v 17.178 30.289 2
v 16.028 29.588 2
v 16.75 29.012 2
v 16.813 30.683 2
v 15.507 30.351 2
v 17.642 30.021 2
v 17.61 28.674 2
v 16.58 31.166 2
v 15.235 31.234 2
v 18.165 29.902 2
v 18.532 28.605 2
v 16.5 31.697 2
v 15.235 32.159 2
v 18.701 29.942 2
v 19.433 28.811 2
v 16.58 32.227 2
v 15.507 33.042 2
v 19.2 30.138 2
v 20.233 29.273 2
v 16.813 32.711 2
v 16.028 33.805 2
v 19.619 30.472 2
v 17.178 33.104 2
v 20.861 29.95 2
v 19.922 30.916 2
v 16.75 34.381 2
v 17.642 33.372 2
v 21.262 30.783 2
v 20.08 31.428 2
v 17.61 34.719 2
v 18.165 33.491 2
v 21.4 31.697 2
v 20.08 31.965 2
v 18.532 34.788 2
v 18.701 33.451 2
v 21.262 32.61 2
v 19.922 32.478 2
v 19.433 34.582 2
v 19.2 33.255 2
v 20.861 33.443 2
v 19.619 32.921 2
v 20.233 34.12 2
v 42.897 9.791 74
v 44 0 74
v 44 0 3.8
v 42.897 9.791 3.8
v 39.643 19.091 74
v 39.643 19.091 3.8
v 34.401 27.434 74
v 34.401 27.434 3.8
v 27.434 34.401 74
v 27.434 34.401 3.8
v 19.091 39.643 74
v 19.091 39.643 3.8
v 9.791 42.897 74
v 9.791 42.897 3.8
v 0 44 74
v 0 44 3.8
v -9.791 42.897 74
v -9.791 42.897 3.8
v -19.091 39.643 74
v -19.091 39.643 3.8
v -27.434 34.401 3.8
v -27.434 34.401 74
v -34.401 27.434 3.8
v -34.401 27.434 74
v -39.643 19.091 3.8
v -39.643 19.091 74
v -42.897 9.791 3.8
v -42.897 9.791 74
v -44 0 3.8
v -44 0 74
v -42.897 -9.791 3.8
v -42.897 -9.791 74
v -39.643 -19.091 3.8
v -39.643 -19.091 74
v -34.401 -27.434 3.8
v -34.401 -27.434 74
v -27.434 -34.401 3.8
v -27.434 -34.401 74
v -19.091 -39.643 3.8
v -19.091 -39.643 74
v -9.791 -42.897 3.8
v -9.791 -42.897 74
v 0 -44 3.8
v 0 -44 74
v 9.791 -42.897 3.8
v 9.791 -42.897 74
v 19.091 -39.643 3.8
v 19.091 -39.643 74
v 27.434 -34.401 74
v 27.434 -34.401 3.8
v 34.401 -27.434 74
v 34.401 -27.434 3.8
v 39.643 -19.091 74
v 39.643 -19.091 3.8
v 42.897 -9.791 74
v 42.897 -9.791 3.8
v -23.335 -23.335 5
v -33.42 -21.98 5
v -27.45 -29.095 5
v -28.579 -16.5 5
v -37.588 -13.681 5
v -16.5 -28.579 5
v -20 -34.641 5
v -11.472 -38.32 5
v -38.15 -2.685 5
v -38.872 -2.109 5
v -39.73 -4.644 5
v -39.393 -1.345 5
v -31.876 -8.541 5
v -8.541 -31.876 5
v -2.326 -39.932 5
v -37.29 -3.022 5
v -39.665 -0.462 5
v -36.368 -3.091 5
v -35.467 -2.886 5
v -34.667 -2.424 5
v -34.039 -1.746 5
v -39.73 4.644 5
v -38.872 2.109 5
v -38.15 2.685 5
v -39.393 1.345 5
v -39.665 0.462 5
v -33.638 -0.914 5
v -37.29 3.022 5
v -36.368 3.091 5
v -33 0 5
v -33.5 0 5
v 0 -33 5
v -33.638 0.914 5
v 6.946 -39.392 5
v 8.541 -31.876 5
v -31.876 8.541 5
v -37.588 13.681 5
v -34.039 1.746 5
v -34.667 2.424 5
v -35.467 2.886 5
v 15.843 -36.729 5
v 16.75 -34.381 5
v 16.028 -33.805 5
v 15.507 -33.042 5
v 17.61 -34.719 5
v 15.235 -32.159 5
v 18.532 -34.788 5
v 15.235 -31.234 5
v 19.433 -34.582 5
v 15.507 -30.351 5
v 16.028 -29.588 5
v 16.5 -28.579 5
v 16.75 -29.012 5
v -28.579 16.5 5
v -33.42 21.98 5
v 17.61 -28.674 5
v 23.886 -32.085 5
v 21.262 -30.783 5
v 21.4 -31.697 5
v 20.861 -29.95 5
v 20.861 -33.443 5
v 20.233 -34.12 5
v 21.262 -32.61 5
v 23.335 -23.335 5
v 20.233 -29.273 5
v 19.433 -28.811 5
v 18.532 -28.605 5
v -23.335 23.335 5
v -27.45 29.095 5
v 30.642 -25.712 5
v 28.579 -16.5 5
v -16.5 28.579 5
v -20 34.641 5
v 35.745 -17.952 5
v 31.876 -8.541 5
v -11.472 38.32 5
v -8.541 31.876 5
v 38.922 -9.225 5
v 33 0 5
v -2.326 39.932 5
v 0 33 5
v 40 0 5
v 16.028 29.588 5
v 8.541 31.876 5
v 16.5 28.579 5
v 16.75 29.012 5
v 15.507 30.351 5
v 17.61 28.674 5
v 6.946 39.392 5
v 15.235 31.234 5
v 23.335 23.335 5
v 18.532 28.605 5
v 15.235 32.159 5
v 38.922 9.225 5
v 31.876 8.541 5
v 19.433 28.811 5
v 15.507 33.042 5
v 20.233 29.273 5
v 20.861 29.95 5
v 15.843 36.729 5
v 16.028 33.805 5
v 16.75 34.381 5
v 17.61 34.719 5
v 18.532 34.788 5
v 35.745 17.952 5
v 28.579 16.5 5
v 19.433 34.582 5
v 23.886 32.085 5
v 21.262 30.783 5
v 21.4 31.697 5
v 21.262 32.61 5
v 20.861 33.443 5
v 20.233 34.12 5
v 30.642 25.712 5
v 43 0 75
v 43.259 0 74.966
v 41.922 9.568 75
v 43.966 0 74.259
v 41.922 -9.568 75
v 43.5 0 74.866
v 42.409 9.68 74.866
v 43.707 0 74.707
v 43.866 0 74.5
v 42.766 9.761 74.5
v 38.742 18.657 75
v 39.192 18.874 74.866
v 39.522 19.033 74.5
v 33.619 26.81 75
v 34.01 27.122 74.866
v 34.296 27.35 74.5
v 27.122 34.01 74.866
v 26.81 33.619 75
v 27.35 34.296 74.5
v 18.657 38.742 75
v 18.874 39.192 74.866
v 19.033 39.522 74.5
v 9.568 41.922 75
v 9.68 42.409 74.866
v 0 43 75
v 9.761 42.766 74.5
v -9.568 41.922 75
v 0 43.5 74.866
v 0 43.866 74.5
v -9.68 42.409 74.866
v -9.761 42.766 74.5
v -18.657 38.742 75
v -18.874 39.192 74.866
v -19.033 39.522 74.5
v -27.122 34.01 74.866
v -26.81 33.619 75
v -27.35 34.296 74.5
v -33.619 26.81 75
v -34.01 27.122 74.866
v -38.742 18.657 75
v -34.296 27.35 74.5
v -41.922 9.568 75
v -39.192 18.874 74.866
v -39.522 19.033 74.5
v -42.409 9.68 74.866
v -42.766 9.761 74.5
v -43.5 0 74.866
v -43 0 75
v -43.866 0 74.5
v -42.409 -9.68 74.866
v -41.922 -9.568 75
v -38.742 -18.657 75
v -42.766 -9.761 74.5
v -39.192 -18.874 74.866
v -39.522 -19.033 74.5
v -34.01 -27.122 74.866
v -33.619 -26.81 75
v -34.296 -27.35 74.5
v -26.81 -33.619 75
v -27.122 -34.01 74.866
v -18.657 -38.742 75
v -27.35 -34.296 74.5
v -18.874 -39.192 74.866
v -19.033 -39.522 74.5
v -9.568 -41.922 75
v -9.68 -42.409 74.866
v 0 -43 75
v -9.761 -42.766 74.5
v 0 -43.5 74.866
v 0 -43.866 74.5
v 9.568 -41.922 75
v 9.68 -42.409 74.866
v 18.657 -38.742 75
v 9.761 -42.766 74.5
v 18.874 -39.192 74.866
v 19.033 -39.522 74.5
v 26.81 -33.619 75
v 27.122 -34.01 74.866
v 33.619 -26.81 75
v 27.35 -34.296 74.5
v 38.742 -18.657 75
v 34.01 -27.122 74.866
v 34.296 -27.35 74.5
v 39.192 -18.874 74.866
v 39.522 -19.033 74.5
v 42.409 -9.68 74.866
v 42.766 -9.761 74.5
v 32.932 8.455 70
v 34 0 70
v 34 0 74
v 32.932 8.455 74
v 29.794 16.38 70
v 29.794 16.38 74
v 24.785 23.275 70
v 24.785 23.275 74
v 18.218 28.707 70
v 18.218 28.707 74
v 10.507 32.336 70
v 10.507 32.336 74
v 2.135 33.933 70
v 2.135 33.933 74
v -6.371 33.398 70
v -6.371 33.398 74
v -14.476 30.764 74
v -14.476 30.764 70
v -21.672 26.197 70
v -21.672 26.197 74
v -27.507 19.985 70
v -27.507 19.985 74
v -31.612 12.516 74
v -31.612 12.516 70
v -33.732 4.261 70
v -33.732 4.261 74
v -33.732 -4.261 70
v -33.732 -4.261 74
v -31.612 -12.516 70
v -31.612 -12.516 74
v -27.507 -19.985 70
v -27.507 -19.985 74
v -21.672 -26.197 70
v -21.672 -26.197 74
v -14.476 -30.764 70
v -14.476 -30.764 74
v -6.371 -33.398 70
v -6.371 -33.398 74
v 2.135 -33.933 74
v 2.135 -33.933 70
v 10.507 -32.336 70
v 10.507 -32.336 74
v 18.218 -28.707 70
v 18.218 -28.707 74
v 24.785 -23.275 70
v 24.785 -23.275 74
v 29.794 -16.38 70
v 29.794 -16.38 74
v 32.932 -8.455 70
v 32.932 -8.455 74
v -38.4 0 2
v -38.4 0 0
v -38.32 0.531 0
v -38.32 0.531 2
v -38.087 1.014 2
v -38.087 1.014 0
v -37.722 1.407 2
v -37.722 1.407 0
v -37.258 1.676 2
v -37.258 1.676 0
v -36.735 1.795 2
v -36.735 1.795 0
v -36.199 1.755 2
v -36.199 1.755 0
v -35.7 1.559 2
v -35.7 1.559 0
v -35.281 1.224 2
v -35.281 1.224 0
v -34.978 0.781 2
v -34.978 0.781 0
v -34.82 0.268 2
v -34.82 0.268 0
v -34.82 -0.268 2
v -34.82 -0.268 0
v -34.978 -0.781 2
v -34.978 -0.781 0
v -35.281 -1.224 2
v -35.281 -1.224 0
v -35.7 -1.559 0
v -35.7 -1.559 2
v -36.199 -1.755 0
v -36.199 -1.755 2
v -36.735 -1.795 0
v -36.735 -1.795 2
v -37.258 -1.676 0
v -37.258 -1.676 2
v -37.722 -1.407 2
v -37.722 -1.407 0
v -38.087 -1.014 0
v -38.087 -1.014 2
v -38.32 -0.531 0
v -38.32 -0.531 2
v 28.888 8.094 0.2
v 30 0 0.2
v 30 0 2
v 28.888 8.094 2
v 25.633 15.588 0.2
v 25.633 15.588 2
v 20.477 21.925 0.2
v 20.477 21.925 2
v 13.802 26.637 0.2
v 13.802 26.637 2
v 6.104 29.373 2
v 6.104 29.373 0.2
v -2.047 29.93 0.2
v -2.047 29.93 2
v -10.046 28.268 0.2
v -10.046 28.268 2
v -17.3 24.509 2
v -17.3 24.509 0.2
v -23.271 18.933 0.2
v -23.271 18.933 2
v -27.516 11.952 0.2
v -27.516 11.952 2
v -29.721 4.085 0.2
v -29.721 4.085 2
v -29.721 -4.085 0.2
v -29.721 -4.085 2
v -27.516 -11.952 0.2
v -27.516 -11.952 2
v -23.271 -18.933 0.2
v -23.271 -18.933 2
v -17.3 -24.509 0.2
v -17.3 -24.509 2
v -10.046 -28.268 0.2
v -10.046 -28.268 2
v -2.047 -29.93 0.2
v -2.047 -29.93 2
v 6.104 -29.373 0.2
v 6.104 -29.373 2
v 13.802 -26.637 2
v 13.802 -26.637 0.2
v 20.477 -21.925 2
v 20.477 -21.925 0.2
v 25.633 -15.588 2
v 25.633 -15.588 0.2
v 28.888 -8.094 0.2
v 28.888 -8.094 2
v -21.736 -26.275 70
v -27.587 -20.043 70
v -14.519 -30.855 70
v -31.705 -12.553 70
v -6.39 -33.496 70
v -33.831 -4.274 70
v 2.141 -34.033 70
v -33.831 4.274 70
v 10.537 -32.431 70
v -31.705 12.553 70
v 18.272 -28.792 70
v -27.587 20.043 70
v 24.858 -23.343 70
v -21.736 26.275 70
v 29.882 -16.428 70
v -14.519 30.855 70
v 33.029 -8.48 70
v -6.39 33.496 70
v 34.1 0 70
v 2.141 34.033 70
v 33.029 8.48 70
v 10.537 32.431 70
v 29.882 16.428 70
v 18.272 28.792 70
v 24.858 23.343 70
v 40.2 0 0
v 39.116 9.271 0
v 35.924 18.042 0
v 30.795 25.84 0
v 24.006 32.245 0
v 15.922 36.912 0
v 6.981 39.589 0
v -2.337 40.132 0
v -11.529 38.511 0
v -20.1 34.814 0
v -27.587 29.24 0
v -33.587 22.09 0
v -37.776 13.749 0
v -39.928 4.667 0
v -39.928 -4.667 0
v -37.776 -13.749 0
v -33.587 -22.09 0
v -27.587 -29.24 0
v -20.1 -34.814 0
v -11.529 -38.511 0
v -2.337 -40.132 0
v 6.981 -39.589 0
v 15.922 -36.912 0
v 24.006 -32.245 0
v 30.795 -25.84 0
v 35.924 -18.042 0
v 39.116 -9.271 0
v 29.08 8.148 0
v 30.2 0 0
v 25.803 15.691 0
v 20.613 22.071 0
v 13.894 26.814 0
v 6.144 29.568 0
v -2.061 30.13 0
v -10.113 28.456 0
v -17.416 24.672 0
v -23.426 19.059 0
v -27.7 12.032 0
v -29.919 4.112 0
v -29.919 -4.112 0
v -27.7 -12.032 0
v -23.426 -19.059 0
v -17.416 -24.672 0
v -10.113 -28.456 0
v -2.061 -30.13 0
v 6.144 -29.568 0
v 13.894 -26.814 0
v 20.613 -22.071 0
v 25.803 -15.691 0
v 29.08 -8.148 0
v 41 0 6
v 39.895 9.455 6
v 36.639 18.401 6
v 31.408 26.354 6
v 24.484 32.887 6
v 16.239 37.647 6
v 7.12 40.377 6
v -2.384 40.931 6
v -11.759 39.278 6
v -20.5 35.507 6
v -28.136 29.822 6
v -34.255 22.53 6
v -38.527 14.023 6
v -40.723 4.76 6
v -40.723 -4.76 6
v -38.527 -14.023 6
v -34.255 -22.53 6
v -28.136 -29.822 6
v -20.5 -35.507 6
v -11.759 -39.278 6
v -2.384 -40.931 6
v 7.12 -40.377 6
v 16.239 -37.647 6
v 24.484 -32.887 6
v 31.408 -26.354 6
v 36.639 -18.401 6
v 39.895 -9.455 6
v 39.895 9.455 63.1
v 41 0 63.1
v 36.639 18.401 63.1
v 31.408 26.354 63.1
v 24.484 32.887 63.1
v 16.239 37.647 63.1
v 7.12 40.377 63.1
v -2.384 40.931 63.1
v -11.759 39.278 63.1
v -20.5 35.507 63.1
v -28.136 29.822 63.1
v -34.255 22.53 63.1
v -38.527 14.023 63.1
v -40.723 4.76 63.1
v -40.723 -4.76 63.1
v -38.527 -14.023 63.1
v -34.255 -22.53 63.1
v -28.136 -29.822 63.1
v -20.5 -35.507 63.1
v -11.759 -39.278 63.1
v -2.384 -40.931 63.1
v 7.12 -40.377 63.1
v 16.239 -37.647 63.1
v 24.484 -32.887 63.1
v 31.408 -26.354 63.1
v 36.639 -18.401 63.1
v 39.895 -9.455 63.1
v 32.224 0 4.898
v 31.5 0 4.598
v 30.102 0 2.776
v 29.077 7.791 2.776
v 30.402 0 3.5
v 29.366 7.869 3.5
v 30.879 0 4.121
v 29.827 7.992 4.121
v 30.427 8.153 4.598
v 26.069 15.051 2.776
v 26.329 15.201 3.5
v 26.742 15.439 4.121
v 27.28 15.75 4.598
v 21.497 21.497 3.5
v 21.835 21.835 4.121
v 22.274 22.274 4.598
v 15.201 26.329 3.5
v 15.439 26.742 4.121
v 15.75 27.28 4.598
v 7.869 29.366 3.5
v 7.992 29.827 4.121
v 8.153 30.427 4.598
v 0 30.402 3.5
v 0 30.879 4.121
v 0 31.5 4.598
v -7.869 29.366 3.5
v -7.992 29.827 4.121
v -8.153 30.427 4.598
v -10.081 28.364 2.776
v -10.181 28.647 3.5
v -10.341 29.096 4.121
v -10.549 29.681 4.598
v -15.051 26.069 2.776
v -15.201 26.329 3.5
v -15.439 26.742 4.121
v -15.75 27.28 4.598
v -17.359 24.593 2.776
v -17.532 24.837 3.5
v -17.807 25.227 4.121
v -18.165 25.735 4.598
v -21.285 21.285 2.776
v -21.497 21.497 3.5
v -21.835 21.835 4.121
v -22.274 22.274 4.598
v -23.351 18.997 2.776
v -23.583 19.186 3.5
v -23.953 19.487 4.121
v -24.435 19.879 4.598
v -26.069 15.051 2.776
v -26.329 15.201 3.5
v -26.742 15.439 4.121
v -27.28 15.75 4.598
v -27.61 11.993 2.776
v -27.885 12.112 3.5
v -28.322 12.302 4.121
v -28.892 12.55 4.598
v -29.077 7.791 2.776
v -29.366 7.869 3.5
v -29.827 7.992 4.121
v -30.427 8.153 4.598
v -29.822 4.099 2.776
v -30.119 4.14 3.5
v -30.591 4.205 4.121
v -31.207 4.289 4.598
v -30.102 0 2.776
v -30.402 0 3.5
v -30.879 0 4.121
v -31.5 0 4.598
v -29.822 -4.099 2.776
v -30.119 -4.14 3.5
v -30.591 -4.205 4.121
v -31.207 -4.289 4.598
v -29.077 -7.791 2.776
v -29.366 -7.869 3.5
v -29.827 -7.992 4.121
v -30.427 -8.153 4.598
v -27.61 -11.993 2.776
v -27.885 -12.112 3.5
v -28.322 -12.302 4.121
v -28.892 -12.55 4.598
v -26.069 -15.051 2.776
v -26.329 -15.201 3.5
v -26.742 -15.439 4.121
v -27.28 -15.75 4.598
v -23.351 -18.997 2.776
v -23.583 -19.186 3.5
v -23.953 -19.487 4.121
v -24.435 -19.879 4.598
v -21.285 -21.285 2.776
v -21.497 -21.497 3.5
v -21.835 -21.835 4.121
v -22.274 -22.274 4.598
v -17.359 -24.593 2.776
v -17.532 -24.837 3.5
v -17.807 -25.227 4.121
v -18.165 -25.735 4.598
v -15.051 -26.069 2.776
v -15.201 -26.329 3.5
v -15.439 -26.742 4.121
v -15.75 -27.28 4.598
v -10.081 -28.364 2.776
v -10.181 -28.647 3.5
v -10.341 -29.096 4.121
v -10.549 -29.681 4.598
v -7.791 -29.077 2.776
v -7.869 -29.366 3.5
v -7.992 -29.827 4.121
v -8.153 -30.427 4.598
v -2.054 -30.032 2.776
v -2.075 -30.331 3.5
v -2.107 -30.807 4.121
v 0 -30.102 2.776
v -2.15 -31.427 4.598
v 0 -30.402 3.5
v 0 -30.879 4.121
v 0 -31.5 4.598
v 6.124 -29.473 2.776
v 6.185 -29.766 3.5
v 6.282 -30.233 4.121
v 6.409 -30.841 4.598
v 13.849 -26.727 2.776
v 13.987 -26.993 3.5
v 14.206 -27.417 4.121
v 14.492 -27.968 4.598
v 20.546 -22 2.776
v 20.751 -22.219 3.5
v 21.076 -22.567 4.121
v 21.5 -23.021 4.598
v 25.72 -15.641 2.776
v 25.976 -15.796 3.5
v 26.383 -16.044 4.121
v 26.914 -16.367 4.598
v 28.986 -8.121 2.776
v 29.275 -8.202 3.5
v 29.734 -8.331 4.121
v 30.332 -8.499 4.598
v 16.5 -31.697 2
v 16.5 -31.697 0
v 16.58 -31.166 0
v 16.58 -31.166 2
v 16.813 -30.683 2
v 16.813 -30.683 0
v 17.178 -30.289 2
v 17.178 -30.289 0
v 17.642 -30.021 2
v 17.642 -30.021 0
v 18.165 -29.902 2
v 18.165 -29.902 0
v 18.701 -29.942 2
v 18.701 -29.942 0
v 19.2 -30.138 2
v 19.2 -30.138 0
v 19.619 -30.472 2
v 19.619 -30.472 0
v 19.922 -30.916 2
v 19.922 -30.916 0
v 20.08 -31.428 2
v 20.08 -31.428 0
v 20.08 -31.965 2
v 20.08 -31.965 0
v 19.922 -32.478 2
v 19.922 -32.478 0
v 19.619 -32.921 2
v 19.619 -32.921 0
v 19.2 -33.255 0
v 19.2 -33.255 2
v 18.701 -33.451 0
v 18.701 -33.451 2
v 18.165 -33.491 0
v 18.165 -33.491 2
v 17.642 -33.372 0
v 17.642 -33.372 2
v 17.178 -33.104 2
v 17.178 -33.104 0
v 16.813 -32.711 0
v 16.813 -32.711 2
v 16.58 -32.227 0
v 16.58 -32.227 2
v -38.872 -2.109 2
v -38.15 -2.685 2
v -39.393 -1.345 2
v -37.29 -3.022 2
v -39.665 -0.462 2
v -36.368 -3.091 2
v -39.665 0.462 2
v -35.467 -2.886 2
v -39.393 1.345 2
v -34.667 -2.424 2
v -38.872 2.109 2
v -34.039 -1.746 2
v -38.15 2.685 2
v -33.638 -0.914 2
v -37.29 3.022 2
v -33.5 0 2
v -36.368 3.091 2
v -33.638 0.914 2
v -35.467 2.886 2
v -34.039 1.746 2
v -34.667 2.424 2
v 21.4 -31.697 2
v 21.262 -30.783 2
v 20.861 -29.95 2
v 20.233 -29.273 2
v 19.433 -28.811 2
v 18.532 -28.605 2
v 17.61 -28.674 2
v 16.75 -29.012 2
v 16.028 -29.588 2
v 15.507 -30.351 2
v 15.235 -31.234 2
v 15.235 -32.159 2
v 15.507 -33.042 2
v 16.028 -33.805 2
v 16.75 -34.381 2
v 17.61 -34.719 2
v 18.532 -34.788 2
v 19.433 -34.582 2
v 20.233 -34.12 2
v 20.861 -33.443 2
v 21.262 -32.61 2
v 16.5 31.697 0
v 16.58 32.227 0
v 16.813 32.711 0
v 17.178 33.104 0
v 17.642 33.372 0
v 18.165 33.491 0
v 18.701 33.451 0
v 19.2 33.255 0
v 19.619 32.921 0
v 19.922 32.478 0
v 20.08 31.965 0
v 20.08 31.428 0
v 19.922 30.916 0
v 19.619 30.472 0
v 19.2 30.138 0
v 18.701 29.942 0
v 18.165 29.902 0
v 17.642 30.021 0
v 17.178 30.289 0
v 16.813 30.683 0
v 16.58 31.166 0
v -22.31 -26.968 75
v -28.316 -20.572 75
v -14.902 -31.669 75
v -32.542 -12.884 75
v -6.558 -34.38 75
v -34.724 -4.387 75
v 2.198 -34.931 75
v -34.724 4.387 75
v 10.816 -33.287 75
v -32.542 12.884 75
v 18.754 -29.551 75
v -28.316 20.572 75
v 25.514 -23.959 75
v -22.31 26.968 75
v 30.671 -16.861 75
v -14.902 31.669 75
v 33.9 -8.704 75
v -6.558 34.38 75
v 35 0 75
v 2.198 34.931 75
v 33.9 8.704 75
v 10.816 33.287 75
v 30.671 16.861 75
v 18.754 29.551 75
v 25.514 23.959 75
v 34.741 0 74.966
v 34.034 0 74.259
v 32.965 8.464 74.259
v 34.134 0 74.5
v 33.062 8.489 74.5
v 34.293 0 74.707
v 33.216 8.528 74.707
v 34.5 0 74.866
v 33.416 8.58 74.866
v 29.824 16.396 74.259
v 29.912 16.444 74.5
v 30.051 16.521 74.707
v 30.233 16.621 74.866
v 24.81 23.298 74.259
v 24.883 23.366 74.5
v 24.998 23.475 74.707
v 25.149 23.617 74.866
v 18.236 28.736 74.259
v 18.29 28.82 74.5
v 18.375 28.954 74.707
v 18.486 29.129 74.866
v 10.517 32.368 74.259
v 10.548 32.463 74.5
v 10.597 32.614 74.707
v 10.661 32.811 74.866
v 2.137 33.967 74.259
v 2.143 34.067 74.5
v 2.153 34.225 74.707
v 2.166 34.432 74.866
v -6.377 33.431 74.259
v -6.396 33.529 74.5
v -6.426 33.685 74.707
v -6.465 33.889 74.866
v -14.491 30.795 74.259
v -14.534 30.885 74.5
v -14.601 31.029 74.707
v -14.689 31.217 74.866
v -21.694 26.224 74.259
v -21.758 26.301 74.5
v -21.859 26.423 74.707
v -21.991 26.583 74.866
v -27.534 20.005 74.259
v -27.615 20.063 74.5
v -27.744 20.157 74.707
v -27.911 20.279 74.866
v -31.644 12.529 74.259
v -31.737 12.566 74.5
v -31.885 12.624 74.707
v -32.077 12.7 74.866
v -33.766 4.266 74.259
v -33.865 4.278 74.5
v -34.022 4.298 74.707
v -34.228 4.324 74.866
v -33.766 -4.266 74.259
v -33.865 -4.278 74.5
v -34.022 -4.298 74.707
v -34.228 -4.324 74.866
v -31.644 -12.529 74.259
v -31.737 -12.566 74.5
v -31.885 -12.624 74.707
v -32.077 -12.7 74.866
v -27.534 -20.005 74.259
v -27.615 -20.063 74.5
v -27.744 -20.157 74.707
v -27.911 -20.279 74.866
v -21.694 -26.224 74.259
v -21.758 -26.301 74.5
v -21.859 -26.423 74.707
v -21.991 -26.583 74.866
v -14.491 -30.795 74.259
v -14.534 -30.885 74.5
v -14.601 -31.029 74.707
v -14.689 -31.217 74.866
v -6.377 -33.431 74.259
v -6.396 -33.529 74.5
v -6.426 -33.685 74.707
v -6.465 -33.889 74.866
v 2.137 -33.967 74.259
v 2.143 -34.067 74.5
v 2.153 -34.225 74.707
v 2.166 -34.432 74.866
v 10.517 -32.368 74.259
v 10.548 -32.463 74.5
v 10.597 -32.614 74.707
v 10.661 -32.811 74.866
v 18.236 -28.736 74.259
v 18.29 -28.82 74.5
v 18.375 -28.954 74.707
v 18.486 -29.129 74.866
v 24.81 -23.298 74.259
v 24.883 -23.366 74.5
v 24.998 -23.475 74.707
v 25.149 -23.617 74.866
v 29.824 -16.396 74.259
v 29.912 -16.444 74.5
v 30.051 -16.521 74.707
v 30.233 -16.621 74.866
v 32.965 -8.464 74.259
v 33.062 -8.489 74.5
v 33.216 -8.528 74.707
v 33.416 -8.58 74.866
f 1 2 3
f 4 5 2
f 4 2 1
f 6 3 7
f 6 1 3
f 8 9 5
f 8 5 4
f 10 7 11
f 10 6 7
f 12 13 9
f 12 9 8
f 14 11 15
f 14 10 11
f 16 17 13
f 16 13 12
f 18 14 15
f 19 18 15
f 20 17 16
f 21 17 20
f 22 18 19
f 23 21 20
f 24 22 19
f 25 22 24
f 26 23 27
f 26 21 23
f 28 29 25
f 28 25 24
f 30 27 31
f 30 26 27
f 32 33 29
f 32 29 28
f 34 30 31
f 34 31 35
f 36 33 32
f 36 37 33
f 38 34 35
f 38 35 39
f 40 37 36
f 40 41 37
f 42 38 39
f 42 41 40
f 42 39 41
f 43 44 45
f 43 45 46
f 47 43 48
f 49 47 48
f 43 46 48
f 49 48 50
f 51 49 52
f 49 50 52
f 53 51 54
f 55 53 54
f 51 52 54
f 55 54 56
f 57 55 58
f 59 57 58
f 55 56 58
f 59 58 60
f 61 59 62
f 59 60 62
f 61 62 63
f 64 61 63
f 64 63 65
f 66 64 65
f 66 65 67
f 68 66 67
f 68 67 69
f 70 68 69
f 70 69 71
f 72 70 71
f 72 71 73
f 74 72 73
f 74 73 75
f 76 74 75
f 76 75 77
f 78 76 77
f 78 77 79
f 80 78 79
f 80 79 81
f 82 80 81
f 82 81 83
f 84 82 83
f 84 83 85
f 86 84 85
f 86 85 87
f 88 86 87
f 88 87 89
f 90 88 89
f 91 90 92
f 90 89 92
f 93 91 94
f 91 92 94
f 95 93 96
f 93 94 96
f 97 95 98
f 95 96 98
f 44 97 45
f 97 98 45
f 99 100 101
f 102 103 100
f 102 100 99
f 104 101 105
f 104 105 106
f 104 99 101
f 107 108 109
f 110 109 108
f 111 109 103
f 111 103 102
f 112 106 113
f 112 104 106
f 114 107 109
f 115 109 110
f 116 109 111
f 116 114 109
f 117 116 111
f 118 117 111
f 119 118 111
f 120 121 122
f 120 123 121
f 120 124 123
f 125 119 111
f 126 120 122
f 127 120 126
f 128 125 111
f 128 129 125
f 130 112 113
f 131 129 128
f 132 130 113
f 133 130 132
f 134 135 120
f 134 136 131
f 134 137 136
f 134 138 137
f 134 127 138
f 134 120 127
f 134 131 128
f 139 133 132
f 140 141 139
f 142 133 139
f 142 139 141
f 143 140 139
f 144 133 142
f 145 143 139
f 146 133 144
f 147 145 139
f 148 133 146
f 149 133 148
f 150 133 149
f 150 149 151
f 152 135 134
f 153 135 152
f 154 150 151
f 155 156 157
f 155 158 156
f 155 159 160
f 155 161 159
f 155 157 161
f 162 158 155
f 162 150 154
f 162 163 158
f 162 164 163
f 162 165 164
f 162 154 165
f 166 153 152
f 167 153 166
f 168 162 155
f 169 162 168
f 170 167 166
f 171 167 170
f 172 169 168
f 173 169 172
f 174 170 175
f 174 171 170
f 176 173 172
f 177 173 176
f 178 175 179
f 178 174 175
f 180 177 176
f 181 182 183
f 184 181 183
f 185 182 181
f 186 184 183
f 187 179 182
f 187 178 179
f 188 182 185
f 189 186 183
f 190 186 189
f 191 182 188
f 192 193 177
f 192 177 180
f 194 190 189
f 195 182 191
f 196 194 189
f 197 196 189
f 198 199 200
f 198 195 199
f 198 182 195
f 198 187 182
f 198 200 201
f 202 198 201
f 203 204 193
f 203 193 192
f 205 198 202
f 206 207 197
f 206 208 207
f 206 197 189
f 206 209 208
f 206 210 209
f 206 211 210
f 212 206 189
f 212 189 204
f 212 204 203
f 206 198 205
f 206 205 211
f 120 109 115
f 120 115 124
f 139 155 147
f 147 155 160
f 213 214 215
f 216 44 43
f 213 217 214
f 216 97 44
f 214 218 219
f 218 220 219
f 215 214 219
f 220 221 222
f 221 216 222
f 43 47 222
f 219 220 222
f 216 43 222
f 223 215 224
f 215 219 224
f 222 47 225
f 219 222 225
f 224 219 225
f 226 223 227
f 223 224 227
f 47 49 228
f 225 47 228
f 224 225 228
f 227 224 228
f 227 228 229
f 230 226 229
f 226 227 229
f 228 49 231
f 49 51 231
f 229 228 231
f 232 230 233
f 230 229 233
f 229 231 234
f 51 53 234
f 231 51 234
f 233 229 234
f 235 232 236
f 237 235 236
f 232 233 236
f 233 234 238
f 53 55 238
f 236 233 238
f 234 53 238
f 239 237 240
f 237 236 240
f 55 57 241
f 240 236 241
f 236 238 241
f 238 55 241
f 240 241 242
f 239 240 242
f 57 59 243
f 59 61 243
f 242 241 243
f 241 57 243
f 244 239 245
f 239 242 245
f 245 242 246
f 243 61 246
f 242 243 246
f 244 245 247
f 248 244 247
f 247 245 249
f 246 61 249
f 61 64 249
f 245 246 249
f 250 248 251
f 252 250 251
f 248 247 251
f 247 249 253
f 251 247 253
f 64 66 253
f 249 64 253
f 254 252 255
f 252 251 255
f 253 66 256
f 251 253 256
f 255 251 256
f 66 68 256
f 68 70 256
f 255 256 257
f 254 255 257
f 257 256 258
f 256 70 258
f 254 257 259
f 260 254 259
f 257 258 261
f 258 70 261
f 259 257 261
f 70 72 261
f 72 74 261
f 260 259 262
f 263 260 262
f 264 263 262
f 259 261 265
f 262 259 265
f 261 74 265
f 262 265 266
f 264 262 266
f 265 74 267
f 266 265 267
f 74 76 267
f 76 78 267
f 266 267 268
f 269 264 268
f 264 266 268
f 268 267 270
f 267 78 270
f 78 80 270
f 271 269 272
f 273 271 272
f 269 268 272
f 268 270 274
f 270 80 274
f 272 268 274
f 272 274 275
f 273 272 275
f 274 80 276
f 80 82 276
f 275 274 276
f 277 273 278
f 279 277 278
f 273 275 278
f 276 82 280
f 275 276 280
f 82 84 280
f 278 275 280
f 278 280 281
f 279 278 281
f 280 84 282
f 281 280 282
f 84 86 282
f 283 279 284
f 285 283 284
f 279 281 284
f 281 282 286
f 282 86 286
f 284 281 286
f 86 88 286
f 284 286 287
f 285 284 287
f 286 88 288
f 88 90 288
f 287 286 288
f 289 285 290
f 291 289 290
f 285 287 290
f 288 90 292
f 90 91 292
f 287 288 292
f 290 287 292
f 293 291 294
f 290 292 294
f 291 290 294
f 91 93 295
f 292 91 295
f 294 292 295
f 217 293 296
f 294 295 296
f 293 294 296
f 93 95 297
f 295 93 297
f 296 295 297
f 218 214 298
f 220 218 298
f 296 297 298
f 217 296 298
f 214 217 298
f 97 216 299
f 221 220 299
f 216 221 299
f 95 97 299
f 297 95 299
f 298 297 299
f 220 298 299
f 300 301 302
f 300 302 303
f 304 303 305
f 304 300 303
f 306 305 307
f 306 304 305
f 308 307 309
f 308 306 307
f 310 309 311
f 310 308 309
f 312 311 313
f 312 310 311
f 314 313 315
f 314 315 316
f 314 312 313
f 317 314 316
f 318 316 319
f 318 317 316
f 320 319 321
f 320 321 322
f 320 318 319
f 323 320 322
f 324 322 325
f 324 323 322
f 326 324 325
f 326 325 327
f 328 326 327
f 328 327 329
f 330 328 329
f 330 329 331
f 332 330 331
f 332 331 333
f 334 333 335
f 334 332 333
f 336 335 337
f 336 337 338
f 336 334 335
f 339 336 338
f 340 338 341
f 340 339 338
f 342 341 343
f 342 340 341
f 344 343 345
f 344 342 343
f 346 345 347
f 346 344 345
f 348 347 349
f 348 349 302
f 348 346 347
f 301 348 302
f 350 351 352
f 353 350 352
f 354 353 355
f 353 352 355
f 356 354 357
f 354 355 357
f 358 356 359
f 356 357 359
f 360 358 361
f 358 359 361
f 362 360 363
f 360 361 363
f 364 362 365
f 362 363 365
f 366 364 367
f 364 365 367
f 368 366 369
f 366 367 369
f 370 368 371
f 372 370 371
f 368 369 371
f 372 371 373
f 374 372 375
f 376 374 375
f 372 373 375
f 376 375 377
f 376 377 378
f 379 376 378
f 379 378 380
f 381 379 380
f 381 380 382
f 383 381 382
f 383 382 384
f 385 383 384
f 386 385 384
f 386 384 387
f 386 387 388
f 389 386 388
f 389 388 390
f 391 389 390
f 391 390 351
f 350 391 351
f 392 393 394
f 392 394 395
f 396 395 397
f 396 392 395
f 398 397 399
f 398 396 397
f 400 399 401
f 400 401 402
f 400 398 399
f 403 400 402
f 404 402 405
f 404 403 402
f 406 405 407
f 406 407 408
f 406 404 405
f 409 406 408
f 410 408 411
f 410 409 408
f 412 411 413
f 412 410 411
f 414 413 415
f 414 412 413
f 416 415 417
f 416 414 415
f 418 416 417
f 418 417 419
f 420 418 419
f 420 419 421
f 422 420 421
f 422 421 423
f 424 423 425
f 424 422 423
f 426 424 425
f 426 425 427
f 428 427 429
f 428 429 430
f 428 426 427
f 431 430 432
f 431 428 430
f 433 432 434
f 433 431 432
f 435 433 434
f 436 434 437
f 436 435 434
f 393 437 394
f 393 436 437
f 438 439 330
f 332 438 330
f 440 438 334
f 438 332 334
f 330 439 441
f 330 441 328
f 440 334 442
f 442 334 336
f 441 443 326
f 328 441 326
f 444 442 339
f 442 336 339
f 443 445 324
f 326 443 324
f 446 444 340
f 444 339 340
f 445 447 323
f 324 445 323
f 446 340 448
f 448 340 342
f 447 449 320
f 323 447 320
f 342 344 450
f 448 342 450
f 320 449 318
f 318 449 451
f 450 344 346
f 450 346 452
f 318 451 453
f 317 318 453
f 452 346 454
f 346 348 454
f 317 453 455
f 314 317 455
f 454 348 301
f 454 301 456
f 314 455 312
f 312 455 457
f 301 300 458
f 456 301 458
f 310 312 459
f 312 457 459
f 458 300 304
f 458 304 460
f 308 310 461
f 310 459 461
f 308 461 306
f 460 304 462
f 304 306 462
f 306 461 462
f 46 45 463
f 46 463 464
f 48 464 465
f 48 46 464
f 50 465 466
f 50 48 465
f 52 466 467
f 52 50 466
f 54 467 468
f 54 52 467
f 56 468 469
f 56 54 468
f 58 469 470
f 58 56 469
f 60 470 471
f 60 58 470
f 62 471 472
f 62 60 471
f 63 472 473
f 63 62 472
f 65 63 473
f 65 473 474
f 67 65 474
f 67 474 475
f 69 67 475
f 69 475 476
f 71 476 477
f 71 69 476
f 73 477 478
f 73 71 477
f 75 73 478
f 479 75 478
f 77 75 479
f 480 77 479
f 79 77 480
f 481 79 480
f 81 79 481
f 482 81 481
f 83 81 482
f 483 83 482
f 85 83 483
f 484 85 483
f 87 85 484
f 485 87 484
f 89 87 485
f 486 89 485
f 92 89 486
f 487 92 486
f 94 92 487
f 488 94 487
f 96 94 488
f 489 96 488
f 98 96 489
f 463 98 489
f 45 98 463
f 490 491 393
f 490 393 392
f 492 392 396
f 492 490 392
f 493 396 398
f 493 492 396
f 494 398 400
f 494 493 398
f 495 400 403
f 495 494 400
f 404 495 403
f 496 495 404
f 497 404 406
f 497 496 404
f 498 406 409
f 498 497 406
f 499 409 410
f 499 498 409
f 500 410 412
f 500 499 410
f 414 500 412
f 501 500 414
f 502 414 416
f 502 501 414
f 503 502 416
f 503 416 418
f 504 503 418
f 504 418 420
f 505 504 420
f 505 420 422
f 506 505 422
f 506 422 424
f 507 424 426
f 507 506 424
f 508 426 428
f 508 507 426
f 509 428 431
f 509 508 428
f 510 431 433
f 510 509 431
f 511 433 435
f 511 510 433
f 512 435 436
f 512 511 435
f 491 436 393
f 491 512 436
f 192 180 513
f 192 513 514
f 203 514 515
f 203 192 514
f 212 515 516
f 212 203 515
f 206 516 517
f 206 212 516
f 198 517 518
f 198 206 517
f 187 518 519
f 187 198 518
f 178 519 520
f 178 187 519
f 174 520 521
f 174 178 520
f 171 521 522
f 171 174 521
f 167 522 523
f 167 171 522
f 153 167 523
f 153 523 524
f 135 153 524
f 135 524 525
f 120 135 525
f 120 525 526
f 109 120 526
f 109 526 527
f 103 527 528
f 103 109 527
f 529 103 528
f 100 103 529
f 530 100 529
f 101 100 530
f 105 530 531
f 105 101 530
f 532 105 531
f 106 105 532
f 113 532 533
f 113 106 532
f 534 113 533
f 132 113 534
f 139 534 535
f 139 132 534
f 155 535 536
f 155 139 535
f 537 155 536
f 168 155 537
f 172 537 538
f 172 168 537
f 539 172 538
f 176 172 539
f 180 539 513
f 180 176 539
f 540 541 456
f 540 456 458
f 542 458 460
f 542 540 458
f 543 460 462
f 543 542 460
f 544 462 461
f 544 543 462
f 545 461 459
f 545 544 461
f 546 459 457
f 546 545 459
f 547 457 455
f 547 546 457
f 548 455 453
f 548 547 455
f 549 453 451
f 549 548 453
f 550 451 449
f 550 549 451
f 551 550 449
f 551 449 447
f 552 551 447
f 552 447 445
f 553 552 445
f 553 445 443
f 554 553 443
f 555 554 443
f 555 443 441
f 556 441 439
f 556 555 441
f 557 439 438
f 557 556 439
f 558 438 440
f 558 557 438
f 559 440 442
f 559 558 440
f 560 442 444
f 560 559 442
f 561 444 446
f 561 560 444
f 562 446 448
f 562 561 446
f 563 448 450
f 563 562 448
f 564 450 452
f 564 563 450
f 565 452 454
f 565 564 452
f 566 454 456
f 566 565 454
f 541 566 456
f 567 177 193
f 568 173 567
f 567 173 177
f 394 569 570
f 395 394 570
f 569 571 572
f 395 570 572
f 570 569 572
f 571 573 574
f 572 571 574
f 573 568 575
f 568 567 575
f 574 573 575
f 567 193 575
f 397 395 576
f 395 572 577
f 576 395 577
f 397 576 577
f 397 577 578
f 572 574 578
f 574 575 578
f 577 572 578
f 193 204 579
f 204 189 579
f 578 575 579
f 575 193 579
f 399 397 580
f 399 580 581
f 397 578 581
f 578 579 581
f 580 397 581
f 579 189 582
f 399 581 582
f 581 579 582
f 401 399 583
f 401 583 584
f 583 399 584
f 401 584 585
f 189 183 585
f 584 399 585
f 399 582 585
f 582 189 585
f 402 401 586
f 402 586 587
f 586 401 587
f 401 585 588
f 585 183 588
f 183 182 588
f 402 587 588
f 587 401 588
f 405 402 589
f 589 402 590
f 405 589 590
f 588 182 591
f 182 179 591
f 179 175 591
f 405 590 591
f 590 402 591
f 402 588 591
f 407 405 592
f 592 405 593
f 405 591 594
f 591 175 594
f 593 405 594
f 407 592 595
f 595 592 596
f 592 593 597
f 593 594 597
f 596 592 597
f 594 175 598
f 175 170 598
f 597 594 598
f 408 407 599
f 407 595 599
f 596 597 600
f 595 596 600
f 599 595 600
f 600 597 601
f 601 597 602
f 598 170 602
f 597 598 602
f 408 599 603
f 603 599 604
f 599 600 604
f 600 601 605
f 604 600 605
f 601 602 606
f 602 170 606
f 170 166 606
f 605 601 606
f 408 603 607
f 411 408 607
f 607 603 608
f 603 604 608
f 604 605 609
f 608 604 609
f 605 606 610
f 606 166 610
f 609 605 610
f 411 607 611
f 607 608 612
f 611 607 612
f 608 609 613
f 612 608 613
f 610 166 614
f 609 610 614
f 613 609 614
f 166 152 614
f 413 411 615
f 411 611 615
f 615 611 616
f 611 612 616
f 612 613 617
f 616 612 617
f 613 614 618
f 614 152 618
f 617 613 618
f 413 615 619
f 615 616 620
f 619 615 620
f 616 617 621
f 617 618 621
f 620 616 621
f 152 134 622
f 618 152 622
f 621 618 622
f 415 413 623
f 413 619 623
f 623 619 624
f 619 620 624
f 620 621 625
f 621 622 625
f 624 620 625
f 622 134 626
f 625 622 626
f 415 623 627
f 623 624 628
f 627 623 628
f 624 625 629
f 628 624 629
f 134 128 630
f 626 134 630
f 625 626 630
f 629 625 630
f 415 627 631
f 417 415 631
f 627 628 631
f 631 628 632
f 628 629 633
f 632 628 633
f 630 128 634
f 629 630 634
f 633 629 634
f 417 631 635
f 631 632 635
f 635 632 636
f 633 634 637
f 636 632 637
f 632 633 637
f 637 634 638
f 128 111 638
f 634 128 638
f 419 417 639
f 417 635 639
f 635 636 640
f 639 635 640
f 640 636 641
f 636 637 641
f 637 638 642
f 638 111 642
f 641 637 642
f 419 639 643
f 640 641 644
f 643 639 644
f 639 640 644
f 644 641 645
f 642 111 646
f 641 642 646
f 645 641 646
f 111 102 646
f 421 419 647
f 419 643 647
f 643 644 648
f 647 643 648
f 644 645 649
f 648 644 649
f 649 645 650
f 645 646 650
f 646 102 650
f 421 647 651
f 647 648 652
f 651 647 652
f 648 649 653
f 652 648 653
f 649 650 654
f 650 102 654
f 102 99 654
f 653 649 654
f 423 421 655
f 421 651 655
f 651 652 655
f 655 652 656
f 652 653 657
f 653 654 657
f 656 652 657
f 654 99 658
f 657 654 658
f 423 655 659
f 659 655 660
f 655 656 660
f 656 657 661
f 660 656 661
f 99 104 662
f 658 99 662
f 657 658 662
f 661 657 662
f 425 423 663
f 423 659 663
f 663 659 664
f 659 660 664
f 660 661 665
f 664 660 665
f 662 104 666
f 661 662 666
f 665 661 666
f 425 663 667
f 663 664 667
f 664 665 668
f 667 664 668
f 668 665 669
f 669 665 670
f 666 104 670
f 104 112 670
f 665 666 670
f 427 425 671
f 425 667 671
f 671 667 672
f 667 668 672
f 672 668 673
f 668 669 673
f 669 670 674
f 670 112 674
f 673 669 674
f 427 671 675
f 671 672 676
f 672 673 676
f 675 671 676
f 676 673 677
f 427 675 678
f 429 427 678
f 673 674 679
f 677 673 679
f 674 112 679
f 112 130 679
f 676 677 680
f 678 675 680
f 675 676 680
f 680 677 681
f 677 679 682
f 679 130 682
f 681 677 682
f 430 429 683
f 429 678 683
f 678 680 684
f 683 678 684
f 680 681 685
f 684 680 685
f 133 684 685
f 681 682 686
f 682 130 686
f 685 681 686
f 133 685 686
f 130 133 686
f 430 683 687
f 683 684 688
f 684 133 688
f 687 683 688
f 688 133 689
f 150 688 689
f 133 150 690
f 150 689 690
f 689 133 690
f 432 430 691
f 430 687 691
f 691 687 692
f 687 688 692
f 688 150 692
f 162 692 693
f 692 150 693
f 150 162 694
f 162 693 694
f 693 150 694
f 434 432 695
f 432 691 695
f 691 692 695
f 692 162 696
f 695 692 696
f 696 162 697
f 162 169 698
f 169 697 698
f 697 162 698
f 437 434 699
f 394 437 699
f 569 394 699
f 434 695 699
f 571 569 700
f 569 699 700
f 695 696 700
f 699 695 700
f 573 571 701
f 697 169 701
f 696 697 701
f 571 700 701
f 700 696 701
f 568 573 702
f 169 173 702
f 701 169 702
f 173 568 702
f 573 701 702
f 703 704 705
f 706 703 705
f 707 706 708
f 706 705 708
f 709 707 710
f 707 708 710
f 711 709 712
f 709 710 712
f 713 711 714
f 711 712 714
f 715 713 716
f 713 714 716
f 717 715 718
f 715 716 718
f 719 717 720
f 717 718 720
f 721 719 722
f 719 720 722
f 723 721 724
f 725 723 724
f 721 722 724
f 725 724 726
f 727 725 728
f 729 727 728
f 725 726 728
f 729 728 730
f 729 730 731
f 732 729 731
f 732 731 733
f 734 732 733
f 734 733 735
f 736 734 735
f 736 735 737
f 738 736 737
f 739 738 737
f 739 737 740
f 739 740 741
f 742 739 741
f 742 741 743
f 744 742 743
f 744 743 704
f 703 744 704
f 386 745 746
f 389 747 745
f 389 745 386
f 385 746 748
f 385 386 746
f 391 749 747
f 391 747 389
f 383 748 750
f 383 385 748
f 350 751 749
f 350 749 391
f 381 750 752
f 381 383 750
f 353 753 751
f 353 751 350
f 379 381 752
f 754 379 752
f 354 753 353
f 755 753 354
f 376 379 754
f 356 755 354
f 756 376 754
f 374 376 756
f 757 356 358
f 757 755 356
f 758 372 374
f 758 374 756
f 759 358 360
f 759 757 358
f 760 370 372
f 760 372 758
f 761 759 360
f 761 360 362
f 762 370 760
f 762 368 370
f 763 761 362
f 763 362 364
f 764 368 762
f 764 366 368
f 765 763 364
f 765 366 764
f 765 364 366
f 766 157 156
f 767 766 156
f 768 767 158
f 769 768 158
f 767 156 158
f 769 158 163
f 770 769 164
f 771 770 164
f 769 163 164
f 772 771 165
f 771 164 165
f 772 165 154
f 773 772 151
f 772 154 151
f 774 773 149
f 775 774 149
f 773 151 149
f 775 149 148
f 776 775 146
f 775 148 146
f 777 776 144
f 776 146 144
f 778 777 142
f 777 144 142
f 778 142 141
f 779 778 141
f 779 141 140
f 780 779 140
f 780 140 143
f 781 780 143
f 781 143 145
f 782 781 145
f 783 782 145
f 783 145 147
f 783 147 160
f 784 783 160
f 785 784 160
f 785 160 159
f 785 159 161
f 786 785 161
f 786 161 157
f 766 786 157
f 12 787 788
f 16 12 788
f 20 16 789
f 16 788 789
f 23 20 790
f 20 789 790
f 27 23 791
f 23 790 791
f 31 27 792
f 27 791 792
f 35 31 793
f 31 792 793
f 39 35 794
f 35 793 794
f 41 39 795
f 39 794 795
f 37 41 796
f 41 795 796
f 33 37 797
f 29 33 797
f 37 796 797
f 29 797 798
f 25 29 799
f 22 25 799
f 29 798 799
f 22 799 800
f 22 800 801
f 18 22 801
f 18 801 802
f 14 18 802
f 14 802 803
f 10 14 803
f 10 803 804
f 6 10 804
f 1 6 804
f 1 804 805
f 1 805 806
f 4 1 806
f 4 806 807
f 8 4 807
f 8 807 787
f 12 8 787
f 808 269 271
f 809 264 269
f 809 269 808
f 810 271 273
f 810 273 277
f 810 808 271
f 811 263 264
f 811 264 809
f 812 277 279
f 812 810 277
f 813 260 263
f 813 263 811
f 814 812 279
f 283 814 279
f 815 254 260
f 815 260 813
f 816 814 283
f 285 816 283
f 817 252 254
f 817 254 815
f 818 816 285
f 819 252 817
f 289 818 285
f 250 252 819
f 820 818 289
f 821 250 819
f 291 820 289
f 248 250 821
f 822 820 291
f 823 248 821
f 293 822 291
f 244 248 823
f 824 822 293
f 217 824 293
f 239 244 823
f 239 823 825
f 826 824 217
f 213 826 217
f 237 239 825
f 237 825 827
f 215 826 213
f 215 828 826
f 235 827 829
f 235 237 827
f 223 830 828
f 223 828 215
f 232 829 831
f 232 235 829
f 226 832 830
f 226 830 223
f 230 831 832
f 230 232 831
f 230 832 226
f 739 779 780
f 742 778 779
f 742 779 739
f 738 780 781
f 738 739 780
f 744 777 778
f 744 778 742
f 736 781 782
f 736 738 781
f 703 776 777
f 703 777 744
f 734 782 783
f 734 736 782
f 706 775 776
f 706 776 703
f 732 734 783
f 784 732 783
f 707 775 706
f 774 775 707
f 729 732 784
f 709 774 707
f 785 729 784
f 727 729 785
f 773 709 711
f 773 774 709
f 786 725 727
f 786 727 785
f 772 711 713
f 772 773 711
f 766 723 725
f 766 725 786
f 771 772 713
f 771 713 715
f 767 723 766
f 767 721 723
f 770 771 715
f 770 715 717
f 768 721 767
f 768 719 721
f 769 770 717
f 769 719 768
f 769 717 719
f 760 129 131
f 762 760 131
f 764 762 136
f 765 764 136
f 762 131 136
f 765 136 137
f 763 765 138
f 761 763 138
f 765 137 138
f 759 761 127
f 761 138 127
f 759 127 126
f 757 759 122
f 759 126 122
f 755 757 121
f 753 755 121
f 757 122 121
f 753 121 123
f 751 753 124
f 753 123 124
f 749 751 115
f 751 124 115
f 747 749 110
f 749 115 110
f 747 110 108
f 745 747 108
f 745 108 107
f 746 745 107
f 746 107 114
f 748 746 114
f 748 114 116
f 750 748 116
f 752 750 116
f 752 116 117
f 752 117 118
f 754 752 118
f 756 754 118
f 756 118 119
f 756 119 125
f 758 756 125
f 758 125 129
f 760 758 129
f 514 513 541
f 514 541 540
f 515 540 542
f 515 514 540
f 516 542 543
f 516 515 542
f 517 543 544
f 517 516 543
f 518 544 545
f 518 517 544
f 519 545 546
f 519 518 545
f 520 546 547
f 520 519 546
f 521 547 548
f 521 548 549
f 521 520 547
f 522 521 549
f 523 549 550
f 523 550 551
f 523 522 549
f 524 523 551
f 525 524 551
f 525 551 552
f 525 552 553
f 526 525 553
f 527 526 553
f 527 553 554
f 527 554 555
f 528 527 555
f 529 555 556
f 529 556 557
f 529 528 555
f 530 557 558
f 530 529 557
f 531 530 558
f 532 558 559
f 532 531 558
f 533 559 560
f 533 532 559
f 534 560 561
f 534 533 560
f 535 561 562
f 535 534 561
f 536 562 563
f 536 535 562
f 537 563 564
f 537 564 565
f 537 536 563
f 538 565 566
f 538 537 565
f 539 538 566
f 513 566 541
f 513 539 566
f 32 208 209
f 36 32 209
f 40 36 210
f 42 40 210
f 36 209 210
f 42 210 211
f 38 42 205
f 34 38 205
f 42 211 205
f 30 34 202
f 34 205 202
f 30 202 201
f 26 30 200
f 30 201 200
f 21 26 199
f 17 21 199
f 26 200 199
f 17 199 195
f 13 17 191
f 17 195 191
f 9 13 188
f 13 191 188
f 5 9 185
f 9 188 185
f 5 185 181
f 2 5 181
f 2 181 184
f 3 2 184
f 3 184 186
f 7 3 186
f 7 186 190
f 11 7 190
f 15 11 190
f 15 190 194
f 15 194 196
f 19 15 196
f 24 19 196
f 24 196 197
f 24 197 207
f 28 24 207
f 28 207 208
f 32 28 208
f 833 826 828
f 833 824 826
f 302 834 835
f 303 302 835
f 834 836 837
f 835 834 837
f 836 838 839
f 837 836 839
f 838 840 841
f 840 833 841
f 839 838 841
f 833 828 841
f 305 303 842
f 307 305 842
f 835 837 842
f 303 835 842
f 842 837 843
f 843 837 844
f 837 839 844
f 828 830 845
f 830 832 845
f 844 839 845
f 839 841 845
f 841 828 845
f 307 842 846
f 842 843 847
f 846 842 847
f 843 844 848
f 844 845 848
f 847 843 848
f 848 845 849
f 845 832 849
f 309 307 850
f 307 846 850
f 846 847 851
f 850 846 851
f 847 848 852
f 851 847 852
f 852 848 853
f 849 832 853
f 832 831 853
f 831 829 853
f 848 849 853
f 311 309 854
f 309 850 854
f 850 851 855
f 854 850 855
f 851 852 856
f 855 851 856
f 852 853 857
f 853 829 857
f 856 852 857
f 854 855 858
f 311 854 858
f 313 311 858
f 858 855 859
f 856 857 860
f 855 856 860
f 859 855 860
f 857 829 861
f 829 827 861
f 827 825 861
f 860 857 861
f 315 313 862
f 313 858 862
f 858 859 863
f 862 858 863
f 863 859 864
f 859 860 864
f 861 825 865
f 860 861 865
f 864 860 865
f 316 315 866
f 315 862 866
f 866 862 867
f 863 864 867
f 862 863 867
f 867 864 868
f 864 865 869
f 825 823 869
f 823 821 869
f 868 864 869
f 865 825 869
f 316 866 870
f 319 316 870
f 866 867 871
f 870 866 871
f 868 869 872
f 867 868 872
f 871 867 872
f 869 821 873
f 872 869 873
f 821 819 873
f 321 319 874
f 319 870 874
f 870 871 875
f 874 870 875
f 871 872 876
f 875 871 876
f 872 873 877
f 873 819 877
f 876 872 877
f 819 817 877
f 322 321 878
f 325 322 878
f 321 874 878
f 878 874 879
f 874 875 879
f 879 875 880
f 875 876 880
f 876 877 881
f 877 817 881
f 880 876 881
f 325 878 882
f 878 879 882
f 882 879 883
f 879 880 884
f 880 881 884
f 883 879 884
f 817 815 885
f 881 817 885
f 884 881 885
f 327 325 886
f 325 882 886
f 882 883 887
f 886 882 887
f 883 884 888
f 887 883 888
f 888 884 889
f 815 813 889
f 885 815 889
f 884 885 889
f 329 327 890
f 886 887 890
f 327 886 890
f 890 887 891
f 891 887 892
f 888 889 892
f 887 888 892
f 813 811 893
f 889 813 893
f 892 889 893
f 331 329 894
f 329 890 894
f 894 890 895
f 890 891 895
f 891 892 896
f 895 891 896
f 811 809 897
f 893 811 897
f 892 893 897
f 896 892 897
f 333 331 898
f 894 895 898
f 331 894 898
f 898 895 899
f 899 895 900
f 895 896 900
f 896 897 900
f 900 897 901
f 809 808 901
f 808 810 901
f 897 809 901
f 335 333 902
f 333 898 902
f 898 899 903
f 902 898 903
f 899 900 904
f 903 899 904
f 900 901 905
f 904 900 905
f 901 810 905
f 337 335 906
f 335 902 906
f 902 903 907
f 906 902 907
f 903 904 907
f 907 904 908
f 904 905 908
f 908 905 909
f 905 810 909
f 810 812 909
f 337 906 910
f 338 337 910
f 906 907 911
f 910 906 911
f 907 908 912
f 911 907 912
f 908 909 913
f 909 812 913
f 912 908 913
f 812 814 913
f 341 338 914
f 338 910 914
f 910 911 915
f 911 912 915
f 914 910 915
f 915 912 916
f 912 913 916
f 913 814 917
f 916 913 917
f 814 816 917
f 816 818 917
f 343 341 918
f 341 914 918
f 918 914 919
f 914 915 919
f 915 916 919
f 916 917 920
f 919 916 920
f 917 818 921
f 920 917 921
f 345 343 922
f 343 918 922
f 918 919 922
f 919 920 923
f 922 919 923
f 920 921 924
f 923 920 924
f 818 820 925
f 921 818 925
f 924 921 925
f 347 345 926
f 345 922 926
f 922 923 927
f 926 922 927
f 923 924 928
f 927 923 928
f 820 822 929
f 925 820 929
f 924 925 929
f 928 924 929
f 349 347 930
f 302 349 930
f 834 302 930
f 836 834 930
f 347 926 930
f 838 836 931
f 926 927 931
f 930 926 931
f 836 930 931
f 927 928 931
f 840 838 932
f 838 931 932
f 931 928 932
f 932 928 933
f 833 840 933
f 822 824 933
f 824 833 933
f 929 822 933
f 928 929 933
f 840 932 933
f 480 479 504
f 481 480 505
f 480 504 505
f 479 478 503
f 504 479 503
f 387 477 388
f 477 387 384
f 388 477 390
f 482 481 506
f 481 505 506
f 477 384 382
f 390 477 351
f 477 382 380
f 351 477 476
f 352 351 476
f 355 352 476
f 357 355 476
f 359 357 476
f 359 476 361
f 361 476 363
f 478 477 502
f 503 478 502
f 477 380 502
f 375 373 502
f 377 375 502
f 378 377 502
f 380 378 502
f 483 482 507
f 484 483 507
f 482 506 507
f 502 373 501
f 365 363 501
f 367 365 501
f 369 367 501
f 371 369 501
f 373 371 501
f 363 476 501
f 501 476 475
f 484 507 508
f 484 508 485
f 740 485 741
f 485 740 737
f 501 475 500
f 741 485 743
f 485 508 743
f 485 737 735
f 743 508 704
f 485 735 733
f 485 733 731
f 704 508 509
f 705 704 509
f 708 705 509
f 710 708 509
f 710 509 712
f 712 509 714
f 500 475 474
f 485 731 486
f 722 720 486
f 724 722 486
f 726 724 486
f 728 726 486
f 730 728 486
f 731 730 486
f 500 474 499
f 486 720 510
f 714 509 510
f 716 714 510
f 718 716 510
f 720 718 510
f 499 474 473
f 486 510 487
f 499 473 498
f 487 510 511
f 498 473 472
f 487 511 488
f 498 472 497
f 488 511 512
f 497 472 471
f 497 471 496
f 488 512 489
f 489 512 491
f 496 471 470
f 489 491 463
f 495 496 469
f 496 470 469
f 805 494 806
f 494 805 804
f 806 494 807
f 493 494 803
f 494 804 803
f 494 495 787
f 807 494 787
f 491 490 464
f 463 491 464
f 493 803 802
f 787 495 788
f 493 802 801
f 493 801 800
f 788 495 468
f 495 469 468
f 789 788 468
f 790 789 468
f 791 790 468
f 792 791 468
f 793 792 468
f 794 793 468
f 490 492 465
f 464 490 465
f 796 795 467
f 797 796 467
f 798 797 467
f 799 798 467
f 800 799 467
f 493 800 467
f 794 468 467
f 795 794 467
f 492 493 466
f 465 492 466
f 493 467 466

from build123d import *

# Parameters (mm, degrees)
SKETCH_R         = 44
SKETCH_R_2       = 30
PAD_DEPTH        = 5
SKETCH001_R      = 44
SKETCH001_R_2    = 41
PAD001_DEPTH     = 65
SKETCH002_R      = 44
SKETCH002_R_2    = 34
PAD002_DEPTH     = 5
HOLE_D           = 3.6
HOLE_DEPTH       = 5
HOLE_CBORE_D     = 6.2
HOLE_CBORE_DEPTH = 3
CHAMFER_SIZE     = 6.9
FILLET_R         = 1
CHAMFER001_SIZE  = 1
CHAMFER002_SIZE  = 3.8
FILLET001_R      = 3
CHAMFER003_SIZE  = 0.2


with BuildPart() as part:
    # Sketch → Pad (new body)
    with BuildSketch(Plane.XY):
        Circle(SKETCH_R)
        Circle(SKETCH_R_2, mode=Mode.SUBTRACT)
    extrude(amount=PAD_DEPTH)

    # Sketch001 (on DatumPlane) → Pad001 (join)
    with BuildSketch(Plane.XY.offset(5)):
        Circle(SKETCH001_R)
        Circle(SKETCH001_R_2, mode=Mode.SUBTRACT)
    extrude(amount=PAD001_DEPTH)

    # Sketch002 (on DatumPlane) → Pad002 (join)
    with BuildSketch(Plane.XY.offset(70)):
        Circle(SKETCH002_R)
        Circle(SKETCH002_R_2, mode=Mode.SUBTRACT)
    extrude(amount=PAD002_DEPTH)

    # Hole
    with Locations(Plane.XY.offset(5)):
        with Locations((-36.6, 0), (18.3, 31.69653), (18.3, -31.69653)):
            CounterBoreHole(HOLE_D / 2, HOLE_CBORE_D / 2, HOLE_CBORE_DEPTH, depth=HOLE_DEPTH)

    # Chamfer
    chamfer_edges = [part.edges().sort_by_distance(p)[0] for p in [
        (-41, 0, 70),
    ]]
    chamfer(chamfer_edges, length=CHAMFER_SIZE)

    # Fillet
    fillet_edges = [part.edges().sort_by_distance(p)[0] for p in [
        (-34, 0, 75),
        (-44, 0, 75),
    ]]
    fillet(fillet_edges, radius=FILLET_R)

    # Chamfer001
    chamfer001_edges = [part.edges().sort_by_distance(p)[0] for p in [
        (-41, 0, 5),
    ]]
    chamfer(chamfer001_edges, length=CHAMFER001_SIZE)

    # Chamfer002
    chamfer002_edges = [part.edges().sort_by_distance(p)[0] for p in [
        (-44, 0, 0),
    ]]
    chamfer(chamfer002_edges, length=CHAMFER002_SIZE)

    # Fillet001
    fillet001_edges = [part.edges().sort_by_distance(p)[0] for p in [
        (-30, 0, 5),
    ]]
    fillet(fillet001_edges, radius=FILLET001_R)

    # Chamfer003
    chamfer003_edges = [part.edges().sort_by_distance(p)[0] for p in [
        (-30, 0, 0),
    ]]
    chamfer(chamfer003_edges, length=CHAMFER003_SIZE)


solid = part.part
